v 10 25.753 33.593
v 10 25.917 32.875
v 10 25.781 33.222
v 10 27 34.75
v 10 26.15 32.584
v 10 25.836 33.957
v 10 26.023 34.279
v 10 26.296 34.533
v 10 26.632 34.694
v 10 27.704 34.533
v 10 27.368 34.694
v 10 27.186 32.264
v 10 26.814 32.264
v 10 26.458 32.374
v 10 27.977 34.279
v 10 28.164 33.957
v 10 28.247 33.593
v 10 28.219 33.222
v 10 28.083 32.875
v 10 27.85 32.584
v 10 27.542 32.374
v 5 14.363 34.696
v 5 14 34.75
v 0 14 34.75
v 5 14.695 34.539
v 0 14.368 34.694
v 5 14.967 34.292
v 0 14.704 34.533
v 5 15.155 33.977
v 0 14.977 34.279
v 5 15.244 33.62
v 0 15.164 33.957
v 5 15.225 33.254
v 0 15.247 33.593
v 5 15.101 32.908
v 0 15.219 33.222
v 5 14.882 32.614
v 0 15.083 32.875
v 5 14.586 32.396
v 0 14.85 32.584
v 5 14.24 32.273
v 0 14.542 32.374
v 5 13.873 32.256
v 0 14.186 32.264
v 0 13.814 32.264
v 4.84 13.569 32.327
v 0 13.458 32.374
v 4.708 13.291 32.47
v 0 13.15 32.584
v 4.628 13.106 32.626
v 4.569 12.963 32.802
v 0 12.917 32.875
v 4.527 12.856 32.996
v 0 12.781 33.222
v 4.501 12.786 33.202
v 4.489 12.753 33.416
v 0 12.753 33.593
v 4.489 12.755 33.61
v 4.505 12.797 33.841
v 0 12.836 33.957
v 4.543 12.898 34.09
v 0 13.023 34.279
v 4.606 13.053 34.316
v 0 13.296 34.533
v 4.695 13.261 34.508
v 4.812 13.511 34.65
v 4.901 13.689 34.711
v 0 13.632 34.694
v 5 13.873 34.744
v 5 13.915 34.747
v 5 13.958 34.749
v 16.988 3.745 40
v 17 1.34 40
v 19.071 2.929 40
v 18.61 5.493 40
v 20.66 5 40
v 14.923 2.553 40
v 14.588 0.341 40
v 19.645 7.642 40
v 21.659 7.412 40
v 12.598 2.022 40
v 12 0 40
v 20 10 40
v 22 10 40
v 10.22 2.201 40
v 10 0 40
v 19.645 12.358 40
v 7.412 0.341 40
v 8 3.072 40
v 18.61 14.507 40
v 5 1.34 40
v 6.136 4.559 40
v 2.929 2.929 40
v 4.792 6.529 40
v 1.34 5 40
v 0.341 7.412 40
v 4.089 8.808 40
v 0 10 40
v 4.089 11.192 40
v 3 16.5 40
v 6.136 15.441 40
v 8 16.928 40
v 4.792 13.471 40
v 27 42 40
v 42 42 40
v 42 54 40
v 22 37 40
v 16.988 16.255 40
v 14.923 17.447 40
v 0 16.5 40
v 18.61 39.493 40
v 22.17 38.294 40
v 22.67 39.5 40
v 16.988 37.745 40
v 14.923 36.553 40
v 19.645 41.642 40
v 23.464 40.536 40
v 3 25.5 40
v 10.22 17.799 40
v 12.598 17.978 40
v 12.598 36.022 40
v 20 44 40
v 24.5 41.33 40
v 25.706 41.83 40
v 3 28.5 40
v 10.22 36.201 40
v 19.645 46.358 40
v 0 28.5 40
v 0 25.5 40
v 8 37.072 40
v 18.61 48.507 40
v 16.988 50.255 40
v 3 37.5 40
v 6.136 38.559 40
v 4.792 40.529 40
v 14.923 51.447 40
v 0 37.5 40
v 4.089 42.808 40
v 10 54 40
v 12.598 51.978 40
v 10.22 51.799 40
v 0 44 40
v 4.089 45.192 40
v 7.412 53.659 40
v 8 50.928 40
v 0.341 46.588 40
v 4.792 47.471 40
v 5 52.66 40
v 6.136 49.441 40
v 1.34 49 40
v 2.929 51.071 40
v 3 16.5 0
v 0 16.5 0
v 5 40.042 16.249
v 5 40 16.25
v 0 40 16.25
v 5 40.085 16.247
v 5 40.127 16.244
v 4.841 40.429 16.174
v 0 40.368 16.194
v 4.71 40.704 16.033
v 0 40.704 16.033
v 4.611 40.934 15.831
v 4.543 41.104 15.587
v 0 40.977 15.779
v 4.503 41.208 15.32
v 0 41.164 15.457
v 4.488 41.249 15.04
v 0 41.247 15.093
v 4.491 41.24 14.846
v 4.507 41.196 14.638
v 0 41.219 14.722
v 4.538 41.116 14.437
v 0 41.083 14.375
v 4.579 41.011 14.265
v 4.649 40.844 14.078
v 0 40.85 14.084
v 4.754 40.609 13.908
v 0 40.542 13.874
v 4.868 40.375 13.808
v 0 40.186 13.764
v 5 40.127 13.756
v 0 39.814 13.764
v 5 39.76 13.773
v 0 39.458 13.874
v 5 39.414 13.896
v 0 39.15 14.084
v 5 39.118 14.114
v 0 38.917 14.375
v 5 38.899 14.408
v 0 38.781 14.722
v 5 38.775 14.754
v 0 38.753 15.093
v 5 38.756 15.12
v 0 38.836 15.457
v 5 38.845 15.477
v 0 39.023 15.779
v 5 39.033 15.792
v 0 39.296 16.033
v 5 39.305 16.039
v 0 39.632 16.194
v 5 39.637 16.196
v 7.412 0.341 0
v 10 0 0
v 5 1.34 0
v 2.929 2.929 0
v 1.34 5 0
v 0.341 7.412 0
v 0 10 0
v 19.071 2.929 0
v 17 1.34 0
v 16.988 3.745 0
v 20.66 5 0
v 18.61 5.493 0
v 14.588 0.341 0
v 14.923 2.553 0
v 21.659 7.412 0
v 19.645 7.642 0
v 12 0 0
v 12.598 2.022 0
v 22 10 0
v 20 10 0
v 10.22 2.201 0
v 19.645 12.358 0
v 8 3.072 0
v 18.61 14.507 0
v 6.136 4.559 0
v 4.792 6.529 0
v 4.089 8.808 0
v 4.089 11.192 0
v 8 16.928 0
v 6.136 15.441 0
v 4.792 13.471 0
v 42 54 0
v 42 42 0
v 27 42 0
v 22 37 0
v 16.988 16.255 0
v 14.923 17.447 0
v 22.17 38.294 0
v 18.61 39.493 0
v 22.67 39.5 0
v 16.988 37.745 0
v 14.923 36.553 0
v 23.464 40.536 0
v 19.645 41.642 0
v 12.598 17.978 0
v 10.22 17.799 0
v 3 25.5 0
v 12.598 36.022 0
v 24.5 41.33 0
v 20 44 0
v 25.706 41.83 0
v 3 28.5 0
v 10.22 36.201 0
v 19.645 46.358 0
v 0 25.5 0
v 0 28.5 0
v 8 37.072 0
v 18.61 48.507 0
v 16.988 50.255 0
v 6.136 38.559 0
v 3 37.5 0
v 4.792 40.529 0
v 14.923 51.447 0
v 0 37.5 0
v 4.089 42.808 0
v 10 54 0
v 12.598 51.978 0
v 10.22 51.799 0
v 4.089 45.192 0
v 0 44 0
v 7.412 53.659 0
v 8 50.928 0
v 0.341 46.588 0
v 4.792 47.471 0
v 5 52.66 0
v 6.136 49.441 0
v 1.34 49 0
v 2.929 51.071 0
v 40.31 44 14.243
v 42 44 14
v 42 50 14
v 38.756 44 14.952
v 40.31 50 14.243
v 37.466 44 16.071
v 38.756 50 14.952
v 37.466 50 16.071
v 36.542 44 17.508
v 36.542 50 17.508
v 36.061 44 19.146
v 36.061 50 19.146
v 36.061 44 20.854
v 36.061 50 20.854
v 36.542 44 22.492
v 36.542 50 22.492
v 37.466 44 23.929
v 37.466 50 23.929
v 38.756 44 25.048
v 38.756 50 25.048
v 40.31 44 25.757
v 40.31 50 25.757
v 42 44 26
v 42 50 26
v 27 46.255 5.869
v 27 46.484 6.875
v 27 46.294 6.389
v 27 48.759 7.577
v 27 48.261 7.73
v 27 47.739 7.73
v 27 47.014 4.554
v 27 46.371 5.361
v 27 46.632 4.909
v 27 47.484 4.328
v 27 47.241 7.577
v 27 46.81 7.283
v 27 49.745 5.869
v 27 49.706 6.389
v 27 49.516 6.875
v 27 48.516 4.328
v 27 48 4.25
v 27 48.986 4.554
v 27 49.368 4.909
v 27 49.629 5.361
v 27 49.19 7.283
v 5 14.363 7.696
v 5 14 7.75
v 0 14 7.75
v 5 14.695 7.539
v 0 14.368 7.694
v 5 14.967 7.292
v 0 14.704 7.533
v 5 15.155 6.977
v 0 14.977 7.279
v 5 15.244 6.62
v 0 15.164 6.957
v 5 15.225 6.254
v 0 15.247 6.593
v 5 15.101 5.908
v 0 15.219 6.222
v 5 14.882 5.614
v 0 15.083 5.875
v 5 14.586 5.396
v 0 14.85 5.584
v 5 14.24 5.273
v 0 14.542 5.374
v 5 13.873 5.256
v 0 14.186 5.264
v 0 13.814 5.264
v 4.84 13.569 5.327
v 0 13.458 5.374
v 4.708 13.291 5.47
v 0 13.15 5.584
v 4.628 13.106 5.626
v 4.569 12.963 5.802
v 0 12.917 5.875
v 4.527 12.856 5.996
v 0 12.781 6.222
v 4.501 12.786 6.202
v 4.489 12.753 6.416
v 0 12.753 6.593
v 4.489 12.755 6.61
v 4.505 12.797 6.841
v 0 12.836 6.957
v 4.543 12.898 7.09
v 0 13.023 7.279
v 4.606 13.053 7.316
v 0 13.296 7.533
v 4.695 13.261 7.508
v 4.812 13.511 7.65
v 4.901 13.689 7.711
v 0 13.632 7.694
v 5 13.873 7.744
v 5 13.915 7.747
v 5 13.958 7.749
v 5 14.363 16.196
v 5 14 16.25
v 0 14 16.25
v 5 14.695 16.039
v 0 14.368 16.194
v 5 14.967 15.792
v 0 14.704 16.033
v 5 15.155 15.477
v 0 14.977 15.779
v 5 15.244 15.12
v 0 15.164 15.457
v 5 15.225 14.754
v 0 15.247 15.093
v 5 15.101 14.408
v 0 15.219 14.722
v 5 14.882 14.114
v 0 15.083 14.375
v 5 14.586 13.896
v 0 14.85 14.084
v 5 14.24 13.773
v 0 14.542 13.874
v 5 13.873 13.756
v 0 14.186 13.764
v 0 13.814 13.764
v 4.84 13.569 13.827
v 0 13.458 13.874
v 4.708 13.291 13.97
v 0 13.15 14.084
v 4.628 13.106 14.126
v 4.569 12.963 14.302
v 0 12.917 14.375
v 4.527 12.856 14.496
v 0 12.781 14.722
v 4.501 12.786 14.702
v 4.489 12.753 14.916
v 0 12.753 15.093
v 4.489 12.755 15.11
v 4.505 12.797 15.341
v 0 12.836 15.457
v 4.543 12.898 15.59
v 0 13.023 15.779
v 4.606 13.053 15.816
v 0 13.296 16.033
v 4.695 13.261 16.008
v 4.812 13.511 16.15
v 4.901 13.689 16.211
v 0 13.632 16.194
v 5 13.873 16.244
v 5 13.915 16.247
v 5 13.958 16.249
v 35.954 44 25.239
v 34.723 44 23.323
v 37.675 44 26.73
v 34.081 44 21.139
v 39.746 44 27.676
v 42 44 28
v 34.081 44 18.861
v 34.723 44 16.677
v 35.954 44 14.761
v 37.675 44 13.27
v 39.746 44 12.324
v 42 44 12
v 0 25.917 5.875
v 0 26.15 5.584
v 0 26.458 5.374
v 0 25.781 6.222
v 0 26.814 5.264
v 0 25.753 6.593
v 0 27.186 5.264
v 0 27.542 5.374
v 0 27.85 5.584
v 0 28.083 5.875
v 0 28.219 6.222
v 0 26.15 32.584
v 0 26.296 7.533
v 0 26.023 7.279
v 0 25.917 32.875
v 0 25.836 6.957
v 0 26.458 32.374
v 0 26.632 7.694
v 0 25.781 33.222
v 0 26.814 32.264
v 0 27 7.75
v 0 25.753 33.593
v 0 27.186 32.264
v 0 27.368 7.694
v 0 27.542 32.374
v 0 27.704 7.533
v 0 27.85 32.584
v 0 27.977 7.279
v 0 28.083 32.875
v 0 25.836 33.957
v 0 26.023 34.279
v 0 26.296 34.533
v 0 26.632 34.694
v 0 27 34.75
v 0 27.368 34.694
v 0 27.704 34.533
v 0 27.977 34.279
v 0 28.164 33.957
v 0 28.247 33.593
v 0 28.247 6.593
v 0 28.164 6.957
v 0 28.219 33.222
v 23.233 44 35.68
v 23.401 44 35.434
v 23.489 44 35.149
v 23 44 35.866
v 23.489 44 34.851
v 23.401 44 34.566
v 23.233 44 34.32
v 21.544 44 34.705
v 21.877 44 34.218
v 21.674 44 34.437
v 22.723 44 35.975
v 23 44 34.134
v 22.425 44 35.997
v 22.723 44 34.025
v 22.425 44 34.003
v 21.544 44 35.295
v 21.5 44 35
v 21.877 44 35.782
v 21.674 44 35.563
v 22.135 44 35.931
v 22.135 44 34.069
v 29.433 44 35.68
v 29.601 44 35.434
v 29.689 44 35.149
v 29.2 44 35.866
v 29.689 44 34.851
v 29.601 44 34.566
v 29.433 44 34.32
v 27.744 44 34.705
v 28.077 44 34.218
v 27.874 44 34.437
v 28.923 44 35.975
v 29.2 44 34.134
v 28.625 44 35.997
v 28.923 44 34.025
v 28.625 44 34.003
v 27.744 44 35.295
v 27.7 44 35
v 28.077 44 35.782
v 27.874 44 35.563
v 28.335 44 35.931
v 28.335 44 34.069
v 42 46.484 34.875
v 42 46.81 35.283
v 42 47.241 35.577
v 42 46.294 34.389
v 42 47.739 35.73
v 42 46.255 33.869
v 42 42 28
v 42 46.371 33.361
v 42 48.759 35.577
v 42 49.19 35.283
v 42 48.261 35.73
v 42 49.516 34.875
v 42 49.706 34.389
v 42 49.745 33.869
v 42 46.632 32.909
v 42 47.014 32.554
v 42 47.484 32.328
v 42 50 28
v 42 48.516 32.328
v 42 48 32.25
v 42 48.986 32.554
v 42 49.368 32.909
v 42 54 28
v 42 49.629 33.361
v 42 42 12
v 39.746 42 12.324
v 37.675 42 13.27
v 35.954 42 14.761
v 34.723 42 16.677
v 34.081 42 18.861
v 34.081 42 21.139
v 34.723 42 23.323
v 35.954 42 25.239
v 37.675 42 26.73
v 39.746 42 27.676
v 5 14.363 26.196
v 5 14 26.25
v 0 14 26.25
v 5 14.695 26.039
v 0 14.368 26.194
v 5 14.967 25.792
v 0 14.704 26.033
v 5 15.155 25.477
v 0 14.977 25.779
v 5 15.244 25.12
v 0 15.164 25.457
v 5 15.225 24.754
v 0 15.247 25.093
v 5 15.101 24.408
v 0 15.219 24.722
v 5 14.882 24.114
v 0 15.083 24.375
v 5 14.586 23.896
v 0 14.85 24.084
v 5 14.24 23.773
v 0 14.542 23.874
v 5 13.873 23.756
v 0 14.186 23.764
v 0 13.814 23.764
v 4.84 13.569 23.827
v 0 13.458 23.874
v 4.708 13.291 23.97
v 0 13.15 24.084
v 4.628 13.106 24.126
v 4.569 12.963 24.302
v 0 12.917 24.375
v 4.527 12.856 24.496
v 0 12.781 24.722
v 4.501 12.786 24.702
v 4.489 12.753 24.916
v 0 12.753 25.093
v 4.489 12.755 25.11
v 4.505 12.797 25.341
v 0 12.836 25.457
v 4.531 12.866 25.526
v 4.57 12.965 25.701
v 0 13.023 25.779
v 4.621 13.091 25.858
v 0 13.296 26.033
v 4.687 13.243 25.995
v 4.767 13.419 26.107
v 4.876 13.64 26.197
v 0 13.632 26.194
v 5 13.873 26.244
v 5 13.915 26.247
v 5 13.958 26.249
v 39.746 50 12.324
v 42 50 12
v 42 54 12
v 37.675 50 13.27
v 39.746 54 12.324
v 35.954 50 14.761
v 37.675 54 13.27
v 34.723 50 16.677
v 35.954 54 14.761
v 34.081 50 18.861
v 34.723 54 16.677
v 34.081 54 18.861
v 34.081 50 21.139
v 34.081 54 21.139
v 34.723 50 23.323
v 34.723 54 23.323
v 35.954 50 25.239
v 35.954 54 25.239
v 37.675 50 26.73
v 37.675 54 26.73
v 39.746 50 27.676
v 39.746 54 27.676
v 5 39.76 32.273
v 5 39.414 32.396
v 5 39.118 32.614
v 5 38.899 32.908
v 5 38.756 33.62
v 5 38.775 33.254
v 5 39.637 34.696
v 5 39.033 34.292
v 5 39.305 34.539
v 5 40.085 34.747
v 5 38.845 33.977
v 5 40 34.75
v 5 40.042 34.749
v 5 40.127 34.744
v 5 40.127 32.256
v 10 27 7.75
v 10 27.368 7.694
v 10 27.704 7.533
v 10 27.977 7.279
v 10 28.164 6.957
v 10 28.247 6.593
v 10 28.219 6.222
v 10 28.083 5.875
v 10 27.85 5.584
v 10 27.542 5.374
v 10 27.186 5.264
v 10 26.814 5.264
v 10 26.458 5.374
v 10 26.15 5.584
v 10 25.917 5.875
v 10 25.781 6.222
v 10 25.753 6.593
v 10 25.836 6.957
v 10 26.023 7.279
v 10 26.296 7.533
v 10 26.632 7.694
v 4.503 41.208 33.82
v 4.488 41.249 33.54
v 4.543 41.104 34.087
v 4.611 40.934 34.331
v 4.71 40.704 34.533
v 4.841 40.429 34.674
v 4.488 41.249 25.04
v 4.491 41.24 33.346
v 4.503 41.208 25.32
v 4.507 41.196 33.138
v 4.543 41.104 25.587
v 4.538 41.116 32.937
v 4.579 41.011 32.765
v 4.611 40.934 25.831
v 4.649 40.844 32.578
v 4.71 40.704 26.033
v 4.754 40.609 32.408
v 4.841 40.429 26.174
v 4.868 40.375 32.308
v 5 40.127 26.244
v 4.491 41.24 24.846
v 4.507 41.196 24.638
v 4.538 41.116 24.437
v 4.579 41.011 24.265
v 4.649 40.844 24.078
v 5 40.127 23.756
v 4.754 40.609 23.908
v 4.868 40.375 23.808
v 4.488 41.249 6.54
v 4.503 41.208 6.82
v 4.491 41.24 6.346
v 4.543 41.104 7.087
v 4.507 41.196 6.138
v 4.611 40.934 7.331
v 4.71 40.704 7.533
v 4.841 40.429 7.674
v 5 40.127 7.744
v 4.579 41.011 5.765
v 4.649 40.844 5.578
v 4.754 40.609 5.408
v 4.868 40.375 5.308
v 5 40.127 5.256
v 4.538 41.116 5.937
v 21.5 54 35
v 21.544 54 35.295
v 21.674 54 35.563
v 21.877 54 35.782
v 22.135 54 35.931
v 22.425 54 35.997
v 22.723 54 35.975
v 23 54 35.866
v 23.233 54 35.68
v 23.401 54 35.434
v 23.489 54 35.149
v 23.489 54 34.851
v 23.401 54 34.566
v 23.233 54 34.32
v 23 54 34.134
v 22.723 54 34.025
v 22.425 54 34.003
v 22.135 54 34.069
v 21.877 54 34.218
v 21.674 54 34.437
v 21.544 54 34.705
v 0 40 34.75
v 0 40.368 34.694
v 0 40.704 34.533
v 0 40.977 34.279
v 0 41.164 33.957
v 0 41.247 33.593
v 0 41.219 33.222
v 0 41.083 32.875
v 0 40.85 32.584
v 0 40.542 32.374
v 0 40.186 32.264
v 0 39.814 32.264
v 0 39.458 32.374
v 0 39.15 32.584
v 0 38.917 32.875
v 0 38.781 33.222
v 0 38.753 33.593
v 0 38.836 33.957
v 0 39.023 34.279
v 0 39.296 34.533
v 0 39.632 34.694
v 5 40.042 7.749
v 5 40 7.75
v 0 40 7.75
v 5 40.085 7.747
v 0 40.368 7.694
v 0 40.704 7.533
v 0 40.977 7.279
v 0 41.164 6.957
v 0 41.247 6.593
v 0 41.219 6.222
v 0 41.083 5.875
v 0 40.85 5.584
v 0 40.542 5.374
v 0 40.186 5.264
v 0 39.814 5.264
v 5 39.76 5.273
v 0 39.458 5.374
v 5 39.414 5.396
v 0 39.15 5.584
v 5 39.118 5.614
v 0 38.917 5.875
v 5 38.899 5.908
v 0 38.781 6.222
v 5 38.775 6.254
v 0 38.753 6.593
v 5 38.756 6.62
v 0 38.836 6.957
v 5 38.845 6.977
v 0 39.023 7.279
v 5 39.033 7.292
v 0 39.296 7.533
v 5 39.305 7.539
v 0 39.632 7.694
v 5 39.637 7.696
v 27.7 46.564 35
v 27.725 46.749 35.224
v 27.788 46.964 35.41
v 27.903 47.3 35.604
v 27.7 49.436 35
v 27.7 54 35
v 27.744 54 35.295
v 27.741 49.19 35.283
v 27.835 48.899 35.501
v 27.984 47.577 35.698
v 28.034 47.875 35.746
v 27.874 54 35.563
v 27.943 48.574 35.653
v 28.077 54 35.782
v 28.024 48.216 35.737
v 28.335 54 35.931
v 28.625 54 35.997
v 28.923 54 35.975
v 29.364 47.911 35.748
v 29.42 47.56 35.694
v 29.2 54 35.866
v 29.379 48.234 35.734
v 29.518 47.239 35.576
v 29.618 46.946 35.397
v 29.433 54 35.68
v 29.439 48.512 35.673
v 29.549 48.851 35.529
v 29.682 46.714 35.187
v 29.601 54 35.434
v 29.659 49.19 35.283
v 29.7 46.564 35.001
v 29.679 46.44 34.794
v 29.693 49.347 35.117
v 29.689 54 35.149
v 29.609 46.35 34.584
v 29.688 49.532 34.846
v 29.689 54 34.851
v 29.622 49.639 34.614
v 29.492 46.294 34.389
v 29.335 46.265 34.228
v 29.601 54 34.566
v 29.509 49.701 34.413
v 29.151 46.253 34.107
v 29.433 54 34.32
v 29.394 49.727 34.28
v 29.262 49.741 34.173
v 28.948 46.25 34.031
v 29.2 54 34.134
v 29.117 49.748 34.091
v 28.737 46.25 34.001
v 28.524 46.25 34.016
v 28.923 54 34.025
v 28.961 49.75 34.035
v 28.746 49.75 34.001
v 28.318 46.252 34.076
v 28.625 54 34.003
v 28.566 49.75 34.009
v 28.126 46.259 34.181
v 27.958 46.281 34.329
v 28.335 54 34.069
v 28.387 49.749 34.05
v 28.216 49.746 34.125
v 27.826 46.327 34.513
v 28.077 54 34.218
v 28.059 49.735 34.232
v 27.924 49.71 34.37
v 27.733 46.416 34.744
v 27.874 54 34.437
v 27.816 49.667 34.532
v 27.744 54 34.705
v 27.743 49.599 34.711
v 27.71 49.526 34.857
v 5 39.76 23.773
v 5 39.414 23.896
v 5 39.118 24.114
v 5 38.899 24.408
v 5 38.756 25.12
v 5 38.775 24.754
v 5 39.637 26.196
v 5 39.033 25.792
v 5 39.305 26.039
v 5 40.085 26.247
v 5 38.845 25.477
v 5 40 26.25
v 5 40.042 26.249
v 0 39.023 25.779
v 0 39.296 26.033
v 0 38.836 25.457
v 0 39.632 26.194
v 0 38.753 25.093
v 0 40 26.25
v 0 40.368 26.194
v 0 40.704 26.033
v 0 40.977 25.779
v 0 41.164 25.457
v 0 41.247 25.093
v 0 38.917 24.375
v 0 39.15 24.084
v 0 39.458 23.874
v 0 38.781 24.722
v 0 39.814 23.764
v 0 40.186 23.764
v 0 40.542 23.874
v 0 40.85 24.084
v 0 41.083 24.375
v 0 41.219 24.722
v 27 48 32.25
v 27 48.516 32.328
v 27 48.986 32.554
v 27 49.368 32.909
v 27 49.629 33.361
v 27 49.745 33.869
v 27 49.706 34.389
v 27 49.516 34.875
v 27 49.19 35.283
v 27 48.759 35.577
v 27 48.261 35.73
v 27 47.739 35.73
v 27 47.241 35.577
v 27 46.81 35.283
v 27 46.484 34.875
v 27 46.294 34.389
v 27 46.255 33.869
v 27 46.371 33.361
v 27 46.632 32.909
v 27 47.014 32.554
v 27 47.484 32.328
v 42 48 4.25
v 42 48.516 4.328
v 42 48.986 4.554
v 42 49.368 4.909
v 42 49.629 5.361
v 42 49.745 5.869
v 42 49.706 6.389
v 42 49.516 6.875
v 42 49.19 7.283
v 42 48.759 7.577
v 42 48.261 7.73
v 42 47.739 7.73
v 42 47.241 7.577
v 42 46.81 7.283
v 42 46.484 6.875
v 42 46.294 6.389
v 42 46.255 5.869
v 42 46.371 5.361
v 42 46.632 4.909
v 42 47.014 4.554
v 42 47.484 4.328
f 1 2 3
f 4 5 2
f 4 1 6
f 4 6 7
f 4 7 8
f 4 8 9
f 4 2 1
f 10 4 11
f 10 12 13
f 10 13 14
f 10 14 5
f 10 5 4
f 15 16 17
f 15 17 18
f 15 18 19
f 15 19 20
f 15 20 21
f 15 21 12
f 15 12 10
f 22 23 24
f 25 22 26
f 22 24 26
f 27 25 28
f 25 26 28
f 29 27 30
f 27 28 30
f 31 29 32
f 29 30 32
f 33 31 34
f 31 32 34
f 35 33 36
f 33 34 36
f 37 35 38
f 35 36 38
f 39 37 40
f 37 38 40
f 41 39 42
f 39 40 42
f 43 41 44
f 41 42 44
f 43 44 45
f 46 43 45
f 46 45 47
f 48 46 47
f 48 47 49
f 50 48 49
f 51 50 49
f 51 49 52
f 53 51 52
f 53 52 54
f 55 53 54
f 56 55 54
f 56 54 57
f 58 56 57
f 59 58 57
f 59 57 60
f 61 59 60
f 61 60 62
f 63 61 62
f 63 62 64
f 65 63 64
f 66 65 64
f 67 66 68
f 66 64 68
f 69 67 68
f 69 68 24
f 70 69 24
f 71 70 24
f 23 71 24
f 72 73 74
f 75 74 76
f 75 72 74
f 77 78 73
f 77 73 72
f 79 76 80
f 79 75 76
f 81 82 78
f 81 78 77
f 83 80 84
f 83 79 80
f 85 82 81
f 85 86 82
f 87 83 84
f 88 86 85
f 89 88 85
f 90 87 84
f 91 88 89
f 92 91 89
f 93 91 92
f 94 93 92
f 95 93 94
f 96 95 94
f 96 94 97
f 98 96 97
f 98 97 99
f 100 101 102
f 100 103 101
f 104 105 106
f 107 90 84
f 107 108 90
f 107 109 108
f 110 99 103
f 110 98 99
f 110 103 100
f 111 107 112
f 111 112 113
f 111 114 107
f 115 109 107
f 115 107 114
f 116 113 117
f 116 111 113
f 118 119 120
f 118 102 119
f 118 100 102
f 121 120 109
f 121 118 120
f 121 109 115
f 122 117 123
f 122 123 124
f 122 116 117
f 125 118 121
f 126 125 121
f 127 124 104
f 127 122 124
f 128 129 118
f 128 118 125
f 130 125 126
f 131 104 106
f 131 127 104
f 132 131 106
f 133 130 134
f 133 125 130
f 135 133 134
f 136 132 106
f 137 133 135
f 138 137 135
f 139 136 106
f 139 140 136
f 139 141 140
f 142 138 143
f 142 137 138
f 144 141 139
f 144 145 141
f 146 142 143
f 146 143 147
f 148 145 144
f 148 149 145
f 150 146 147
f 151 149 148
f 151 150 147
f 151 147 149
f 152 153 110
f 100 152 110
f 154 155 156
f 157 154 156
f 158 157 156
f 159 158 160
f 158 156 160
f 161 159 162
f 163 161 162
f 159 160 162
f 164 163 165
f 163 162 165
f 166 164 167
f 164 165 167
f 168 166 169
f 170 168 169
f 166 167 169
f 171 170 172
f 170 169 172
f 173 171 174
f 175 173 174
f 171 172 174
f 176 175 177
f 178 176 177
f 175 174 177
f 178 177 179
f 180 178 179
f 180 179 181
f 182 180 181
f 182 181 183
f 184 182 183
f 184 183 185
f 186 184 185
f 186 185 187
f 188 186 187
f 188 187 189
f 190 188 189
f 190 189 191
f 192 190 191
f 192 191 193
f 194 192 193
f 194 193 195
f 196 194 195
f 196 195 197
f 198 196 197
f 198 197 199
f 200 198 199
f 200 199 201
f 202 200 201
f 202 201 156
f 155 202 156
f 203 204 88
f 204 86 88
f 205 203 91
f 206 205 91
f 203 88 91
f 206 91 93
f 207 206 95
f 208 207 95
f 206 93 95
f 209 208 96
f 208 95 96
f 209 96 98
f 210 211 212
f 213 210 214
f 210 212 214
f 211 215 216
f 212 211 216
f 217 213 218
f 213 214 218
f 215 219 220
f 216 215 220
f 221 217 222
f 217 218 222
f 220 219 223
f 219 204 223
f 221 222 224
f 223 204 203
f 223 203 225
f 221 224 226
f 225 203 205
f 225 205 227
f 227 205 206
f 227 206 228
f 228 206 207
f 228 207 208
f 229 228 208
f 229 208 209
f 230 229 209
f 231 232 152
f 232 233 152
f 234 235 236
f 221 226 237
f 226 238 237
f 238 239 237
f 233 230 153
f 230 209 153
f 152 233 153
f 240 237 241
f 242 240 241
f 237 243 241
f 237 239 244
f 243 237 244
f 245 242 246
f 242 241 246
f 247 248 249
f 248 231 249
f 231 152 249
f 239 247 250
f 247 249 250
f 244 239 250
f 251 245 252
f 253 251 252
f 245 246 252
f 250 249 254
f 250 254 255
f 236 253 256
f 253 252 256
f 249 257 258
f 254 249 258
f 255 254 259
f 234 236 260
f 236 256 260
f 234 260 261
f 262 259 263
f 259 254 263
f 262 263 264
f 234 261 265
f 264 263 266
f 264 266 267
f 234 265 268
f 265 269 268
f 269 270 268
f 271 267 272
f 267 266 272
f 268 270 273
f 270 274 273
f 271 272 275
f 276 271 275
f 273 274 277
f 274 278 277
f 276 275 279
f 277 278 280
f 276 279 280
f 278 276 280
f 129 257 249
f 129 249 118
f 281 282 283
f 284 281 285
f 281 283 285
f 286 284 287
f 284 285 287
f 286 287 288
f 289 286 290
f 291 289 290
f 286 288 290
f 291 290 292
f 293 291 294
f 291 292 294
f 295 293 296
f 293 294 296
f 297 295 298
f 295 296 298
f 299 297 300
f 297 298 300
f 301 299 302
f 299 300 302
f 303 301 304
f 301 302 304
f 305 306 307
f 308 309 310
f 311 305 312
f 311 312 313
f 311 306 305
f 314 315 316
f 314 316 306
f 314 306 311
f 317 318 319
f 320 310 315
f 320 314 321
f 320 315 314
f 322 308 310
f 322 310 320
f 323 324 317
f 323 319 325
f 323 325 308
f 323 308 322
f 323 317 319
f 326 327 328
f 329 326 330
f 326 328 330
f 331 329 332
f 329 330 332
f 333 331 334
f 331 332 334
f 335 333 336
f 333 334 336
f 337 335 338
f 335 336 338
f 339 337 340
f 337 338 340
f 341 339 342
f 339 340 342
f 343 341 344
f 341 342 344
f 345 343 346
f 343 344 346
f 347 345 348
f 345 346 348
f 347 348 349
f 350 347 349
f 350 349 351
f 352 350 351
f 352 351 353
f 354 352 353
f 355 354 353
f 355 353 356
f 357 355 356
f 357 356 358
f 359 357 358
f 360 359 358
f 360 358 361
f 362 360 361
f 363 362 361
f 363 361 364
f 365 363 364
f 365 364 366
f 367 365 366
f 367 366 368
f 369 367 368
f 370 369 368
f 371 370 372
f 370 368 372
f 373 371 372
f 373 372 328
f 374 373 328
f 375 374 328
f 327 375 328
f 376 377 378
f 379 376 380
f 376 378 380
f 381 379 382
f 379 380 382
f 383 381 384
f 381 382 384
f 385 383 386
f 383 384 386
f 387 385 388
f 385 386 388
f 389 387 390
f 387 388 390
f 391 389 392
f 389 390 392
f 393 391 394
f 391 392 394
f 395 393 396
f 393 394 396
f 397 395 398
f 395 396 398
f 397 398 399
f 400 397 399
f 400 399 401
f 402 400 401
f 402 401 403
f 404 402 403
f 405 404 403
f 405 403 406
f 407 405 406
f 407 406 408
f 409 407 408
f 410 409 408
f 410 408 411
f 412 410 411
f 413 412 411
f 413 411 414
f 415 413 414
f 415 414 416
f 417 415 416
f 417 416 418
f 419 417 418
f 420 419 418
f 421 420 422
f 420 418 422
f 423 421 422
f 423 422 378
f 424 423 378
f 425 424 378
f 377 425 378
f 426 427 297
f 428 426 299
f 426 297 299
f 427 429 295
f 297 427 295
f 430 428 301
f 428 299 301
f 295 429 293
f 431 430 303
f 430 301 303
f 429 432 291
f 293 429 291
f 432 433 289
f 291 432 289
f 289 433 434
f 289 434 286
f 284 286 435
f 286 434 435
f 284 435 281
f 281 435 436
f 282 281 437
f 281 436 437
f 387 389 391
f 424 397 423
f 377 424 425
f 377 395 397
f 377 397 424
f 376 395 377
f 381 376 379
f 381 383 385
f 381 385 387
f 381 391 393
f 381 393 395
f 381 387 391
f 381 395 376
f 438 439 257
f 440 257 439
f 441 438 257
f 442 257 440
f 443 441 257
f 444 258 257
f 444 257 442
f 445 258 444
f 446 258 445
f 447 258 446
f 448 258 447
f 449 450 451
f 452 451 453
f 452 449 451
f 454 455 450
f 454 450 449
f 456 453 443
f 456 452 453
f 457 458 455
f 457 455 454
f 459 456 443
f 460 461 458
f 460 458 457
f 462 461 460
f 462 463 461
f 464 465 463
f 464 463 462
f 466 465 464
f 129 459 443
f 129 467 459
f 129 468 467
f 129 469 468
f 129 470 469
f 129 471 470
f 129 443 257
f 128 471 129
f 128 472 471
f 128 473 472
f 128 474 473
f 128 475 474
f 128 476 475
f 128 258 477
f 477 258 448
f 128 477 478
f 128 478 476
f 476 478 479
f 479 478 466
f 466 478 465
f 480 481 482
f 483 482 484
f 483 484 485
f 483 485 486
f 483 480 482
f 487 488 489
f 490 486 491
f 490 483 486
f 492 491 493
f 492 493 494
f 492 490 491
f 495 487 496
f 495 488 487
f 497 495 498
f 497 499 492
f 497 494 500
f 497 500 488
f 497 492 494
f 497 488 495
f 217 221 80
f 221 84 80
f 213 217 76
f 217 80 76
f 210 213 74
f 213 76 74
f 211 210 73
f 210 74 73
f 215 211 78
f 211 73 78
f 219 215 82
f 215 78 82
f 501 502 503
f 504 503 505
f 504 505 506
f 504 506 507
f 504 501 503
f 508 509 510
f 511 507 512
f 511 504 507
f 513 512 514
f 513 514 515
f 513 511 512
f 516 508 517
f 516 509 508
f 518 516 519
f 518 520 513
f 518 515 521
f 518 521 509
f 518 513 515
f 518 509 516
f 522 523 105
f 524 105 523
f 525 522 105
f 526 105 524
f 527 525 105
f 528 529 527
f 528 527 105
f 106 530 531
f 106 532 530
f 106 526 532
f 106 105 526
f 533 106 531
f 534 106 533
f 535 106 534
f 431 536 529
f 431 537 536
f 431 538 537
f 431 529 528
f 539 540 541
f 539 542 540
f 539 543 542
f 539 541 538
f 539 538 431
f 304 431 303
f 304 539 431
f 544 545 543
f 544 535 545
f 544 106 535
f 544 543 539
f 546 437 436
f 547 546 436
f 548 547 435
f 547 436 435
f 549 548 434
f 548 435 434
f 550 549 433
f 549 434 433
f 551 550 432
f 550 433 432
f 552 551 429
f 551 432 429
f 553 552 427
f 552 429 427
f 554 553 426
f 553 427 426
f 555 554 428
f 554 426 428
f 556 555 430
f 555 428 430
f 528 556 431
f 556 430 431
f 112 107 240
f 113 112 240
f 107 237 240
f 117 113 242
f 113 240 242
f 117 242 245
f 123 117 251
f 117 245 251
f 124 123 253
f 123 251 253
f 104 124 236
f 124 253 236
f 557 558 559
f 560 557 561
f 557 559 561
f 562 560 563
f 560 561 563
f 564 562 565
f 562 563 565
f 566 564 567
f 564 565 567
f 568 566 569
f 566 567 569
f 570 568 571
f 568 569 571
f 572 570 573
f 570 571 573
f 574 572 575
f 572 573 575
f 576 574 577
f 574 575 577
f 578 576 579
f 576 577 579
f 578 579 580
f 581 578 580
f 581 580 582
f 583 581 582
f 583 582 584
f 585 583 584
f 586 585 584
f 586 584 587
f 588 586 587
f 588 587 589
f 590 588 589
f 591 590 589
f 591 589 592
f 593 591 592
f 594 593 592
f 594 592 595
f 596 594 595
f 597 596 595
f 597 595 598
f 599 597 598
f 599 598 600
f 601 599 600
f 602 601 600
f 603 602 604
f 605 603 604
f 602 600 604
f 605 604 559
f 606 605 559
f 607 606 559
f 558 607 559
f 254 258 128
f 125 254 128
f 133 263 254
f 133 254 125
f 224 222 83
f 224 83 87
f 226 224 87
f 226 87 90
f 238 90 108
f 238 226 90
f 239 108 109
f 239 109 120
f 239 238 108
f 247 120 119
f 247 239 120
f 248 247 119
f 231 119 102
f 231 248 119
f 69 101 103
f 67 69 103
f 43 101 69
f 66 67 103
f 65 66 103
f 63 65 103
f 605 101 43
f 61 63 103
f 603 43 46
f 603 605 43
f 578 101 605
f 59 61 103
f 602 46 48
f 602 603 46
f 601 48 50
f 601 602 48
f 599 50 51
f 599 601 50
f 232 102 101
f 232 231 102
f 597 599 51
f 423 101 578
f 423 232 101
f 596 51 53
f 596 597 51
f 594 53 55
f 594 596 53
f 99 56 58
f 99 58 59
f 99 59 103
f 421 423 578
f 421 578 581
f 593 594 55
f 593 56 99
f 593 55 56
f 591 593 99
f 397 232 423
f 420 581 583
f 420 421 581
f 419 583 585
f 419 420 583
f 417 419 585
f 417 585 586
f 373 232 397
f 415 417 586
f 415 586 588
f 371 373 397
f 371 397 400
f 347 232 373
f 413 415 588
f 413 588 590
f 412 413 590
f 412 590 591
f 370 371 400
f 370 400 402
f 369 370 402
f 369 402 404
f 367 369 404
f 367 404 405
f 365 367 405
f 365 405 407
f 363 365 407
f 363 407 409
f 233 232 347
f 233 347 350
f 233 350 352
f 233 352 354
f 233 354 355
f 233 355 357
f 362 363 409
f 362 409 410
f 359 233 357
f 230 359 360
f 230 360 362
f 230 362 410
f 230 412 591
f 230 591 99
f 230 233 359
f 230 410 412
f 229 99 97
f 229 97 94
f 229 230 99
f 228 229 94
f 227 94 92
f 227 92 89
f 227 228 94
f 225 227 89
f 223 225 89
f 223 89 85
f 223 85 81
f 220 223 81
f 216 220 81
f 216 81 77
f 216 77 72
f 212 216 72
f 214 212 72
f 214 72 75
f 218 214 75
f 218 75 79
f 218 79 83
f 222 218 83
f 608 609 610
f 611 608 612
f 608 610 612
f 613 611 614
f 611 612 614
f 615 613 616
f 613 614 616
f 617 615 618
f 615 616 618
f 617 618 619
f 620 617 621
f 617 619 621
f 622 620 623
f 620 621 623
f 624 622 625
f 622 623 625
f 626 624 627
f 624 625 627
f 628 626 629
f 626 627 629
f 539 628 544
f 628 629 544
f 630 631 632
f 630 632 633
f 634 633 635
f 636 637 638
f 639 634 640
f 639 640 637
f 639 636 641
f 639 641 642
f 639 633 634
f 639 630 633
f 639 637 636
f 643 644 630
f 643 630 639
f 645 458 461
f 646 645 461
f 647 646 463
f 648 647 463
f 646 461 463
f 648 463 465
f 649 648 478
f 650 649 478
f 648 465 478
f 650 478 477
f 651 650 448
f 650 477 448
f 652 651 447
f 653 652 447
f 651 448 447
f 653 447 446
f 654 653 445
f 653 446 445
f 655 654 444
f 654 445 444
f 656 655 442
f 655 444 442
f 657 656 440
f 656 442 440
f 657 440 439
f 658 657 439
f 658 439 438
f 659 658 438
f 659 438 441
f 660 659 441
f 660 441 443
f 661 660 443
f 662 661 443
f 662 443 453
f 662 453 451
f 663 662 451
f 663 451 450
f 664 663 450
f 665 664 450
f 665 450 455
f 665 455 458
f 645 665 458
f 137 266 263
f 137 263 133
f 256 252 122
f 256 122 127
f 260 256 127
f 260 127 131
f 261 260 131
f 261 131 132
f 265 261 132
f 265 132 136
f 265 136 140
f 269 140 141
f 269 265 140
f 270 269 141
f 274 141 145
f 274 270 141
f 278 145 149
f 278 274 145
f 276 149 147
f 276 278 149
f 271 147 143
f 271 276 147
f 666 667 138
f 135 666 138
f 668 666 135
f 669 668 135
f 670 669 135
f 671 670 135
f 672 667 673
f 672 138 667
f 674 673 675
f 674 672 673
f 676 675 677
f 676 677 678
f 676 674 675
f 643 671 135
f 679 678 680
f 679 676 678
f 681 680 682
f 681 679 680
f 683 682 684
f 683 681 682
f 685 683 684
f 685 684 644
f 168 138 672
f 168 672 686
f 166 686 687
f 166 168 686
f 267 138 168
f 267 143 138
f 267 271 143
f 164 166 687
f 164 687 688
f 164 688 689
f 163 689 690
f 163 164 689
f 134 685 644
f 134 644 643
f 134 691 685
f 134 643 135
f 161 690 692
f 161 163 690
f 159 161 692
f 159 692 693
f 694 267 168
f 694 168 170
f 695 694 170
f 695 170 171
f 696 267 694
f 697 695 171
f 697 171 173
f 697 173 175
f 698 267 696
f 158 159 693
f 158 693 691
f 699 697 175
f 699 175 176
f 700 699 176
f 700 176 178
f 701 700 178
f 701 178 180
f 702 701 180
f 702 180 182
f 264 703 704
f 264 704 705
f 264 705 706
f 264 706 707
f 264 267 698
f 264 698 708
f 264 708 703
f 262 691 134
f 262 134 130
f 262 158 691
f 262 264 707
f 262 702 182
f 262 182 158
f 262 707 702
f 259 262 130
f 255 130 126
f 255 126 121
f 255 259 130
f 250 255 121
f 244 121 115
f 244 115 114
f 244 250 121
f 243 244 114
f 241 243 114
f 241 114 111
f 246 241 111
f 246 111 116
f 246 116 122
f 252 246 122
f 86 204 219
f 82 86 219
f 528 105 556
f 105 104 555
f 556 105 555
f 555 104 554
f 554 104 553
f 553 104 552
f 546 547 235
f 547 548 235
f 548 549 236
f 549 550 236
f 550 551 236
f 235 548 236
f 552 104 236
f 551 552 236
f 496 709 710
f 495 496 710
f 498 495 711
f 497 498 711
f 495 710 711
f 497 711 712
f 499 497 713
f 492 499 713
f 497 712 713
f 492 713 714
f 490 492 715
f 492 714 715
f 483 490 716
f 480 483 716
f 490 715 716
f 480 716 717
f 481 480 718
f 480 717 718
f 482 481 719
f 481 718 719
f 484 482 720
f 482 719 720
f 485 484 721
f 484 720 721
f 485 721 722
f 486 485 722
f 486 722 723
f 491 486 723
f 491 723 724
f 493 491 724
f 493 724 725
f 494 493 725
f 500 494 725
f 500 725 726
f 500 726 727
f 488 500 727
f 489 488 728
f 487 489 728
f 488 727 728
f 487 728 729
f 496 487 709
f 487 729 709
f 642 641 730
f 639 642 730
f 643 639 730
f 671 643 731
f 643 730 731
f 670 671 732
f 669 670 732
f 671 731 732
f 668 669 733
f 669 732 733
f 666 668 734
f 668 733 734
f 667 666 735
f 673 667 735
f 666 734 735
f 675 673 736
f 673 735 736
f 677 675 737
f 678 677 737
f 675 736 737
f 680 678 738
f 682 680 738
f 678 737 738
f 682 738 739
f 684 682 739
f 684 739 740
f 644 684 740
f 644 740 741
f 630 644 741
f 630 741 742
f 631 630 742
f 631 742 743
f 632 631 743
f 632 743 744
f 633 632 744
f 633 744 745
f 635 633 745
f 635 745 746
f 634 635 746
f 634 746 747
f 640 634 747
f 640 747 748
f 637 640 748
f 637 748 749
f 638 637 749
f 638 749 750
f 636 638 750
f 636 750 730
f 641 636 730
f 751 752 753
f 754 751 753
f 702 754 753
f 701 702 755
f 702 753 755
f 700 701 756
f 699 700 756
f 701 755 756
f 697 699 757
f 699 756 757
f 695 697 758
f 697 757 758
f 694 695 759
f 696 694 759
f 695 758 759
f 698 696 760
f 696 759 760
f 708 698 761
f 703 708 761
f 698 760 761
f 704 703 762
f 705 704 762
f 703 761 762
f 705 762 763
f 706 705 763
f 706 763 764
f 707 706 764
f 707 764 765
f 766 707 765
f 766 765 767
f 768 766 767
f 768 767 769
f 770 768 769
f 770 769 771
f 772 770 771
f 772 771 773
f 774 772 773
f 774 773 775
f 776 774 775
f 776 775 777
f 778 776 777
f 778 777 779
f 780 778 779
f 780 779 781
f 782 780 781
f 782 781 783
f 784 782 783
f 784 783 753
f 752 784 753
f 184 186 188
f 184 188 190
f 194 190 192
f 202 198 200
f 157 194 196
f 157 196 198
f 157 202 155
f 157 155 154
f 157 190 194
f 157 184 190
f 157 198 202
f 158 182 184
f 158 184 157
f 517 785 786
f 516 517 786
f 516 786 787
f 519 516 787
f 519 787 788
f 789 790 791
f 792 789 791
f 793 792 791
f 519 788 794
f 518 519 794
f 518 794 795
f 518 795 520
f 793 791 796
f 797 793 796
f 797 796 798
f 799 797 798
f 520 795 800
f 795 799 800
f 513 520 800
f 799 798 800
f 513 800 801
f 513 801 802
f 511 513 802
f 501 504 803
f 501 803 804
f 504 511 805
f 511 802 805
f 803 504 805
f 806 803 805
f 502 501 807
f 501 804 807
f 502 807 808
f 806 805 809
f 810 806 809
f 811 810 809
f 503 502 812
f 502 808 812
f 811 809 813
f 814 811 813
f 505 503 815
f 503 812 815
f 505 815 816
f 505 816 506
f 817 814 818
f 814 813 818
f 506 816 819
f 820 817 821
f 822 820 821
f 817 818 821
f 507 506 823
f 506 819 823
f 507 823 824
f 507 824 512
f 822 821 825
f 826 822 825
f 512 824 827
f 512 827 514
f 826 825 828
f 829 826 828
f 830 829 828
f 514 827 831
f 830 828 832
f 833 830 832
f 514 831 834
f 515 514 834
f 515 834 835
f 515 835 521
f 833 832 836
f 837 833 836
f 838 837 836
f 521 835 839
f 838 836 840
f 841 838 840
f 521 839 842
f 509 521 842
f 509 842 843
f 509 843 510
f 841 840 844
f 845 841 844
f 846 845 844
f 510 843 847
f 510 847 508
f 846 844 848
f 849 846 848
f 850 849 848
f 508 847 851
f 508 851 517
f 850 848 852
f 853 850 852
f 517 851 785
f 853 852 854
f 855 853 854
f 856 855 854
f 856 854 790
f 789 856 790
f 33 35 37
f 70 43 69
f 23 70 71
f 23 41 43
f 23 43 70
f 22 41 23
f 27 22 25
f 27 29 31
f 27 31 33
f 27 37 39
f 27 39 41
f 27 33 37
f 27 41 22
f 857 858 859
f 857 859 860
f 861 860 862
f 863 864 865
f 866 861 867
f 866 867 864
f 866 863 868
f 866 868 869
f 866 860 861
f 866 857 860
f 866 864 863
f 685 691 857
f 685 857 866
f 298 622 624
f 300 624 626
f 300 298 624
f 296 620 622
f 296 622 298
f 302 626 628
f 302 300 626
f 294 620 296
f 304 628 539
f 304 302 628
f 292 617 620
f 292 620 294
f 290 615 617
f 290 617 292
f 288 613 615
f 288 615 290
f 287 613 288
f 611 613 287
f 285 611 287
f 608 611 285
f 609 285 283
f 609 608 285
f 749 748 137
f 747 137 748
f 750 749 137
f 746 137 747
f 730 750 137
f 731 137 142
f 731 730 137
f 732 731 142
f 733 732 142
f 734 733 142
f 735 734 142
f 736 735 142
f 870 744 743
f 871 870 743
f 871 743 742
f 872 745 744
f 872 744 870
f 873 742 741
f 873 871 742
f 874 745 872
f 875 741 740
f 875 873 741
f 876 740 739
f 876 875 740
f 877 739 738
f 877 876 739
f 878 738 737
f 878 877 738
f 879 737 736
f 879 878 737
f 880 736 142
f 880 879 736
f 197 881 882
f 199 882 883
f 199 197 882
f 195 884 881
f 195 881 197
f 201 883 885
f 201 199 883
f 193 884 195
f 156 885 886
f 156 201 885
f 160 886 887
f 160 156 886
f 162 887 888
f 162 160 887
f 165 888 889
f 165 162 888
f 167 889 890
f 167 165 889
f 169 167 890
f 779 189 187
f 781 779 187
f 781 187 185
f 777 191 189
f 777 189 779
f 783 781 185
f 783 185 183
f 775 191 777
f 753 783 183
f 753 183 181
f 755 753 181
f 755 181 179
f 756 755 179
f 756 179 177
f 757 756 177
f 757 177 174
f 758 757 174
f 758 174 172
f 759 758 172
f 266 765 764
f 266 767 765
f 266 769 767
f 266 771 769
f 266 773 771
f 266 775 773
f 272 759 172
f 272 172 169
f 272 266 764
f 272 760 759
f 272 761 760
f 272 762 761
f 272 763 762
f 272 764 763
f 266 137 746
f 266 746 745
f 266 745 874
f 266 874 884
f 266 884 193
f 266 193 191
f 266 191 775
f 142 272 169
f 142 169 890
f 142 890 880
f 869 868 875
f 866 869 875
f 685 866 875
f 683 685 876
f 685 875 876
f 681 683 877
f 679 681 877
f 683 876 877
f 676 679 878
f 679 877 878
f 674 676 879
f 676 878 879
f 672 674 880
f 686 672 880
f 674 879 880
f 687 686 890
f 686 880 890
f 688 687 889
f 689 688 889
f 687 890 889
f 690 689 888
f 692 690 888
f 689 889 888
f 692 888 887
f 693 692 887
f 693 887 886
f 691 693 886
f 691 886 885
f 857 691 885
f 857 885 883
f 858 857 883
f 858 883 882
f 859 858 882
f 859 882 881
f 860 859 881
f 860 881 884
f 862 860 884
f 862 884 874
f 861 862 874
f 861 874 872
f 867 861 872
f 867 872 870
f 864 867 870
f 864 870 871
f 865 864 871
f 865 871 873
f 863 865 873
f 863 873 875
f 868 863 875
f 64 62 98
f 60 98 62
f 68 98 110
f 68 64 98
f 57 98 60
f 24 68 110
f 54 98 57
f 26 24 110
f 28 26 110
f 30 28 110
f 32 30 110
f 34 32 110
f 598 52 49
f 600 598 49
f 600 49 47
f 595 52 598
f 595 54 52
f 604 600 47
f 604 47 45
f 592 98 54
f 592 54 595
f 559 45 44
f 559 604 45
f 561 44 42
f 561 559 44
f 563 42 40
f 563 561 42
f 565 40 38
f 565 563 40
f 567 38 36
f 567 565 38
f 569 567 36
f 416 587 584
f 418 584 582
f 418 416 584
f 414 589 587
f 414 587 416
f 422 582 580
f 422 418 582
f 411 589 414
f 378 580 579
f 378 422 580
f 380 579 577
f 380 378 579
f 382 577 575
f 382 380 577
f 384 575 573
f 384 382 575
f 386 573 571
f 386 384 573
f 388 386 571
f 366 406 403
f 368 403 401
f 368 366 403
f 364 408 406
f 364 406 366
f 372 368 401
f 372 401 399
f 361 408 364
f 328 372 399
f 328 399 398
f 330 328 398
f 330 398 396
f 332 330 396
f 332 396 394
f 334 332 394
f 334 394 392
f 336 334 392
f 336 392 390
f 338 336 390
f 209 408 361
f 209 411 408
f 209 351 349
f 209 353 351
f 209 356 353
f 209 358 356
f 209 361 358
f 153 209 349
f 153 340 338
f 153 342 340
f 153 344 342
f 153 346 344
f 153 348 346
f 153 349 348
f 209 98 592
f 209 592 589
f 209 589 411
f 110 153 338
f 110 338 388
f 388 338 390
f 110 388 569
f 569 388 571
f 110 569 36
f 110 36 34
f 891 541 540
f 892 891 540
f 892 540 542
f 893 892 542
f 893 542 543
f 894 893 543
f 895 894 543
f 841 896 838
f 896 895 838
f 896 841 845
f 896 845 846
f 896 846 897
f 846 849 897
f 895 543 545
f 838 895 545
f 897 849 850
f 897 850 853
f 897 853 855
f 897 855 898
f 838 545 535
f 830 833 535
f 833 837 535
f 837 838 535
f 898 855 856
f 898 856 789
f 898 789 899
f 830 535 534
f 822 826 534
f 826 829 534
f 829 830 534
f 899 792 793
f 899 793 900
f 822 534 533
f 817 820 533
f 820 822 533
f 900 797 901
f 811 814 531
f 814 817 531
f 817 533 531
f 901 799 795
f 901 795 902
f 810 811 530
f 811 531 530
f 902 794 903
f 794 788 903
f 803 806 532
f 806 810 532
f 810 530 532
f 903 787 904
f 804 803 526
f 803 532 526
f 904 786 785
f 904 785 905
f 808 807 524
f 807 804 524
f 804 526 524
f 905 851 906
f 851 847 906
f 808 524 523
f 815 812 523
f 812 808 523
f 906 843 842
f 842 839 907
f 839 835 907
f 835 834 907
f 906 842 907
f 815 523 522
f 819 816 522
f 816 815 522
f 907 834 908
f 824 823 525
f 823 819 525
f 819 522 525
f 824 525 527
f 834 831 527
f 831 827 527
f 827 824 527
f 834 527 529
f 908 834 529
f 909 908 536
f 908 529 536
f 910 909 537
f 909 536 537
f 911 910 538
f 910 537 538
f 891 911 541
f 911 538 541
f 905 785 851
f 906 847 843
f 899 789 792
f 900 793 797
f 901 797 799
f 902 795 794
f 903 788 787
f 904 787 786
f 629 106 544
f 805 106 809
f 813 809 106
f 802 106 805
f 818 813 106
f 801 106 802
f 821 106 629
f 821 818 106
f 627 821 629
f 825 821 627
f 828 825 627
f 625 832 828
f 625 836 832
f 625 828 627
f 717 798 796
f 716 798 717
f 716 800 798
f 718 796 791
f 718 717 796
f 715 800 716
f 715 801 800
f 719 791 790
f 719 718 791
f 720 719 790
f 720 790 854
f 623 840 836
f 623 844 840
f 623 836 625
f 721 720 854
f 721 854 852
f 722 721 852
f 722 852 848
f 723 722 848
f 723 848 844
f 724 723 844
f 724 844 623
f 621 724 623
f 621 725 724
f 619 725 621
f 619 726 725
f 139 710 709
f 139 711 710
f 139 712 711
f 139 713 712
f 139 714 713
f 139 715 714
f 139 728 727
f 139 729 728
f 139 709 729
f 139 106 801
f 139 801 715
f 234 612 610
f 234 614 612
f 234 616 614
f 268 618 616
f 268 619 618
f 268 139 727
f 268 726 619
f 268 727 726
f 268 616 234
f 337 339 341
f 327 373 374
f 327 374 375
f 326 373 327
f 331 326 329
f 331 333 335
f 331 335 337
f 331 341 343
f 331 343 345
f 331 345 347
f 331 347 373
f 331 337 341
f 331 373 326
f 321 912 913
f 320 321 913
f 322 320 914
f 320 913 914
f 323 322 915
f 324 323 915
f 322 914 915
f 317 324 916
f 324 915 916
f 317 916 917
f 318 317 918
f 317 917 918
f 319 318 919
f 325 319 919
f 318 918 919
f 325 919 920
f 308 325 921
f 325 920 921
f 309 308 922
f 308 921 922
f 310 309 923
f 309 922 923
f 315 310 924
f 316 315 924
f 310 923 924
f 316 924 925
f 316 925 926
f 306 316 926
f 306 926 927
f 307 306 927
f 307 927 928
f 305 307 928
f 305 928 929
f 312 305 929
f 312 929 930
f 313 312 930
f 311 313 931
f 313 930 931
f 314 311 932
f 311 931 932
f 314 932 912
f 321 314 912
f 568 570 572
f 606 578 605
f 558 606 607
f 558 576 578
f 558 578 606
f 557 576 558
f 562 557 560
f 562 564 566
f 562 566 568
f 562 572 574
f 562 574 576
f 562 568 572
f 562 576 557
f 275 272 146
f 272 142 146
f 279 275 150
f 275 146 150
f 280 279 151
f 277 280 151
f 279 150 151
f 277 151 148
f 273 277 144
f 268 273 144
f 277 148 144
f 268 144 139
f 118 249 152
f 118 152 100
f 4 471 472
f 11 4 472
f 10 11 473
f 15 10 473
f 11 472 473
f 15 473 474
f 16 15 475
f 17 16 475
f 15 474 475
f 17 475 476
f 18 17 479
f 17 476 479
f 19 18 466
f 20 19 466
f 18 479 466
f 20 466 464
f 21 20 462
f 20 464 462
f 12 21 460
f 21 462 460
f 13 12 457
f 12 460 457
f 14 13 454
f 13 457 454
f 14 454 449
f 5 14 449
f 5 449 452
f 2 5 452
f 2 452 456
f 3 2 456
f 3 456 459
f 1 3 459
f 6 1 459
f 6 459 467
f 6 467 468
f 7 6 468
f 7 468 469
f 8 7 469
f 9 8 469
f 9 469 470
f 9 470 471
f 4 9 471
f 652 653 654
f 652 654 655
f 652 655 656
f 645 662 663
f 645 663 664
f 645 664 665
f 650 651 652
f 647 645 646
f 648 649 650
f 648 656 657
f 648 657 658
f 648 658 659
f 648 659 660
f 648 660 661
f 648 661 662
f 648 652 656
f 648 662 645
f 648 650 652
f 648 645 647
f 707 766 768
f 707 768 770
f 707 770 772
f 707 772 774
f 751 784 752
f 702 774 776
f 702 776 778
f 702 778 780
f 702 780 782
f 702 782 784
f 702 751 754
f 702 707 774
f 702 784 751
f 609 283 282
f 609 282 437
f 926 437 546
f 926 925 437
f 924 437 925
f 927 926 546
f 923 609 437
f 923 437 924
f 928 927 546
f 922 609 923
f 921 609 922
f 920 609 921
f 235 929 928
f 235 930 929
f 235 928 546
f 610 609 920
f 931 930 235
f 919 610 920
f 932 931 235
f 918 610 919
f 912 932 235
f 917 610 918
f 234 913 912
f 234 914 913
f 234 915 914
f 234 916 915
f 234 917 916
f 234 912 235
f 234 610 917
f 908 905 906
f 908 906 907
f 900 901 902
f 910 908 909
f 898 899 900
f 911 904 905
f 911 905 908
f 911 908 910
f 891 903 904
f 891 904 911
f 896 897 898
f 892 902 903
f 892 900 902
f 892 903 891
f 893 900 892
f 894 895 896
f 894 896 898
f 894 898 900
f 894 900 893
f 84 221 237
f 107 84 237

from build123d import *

# Parameters (mm, degrees)
SKETCH1_W           = 22
SKETCH1_H           = 54
SKETCH1_R           = 8
BOSS_EXTRUDE1_DEPTH = 40
SKETCH2_W           = 48
SKETCH2_H           = 21
CUT_EXTRUDE1_DEPTH  = 3
SKETCH6_W           = 40
SKETCH6_H           = 12
BOSS_EXTRUDE2_DEPTH = 20
SKETCH7_R           = 8
CUT_EXTRUDE5_DEPTH  = 4
CUT_EXTRUDE6_START  = -10
SKETCH7_2_R         = 8
CUT_EXTRUDE6_DEPTH  = 3
SKETCH8_R           = 6
CUT_EXTRUDE7_DEPTH  = 7
SKETCH9_R           = 1.75
CUT_EXTRUDE8_DEPTH  = 15
SKETCH10_R          = 1.25
CUT_EXTRUDE9_DEPTH  = 5
SKETCH13_R          = 1.25
CUT_EXTRUDE10_DEPTH = 10
BOSS_EXTRUDE3_START = 3
SKETCH14_W          = 40
SKETCH14_H          = 3
SKETCH14_R          = 1.25
BOSS_EXTRUDE3_DEPTH = 3
FILLET1_R           = 10
FILLET2_R           = 5
SKETCH15_R          = 1
CUT_EXTRUDE11_DEPTH = 10


with BuildPart() as part:
    # Sketch1 → Boss-Extrude1 (new body)
    with BuildSketch(Plane.XY):
        with Locations((11, 27)):
            Rectangle(SKETCH1_W, SKETCH1_H)
        with Locations((12, 10)):
            Circle(SKETCH1_R, mode=Mode.SUBTRACT)
        with Locations((12, 44)):
            Circle(SKETCH1_R, mode=Mode.SUBTRACT)
    extrude(amount=BOSS_EXTRUDE1_DEPTH)

    # Sketch2 → Cut-Extrude1 (cut)
    with BuildSketch(Plane.ZY):
        with Locations((24, 27)):
            Rectangle(SKETCH2_W, SKETCH2_H)
    extrude(amount=-CUT_EXTRUDE1_DEPTH, mode=Mode.SUBTRACT)

    # Sketch6 → Boss-Extrude2 (add)
    with BuildSketch(Plane(origin=(22, 0, 0), x_dir=(0, 0, -1), z_dir=(1, 0, 0))):
        with Locations((-20, 48)):
            Rectangle(SKETCH6_W, SKETCH6_H)
    extrude(amount=BOSS_EXTRUDE2_DEPTH)

    # Sketch7 → Cut-Extrude5 (cut)
    with BuildSketch(Plane(origin=(0, 54, 0), x_dir=(1, 0, 0), z_dir=(0, 1, 0))):
        with Locations((42, -20)):
            Circle(SKETCH7_R)
    extrude(amount=-CUT_EXTRUDE5_DEPTH, mode=Mode.SUBTRACT)

    # Sketch7<2> → Cut-Extrude6 (cut)
    with BuildSketch(Plane(origin=(0, 54, 0), x_dir=(1, 0, 0), z_dir=(0, 1, 0)).offset(CUT_EXTRUDE6_START)):
        with Locations((42, -20)):
            Circle(SKETCH7_2_R)
    extrude(amount=-CUT_EXTRUDE6_DEPTH, mode=Mode.SUBTRACT)

    # Sketch8 → Cut-Extrude7 (cut)
    with BuildSketch(Plane(origin=(0, 50, 0), x_dir=(1, 0, 0), z_dir=(0, 1, 0))):
        with Locations((42, -20)):
            Circle(SKETCH8_R)
    extrude(amount=-CUT_EXTRUDE7_DEPTH, mode=Mode.SUBTRACT)

    # Sketch9 → Cut-Extrude8 (cut)
    with BuildSketch(Plane(origin=(42, 0, 0), x_dir=(0, 0, -1), z_dir=(1, 0, 0))):
        with Locations((-34, 48)):
            Circle(SKETCH9_R)
        with Locations((-6, 48)):
            Circle(SKETCH9_R)
    extrude(amount=-CUT_EXTRUDE8_DEPTH, mode=Mode.SUBTRACT)

    # Sketch10 → Cut-Extrude9 (cut)
    with BuildSketch(Plane.ZY):
        with Locations((33.5, 40)):
            Circle(SKETCH10_R)
        with Locations((33.5, 14)):
            Circle(SKETCH10_R)
        with Locations((6.5, 14)):
            Circle(SKETCH10_R)
        with Locations((6.5, 40)):
            Circle(SKETCH10_R)
        with Locations((15, 40)):
            Circle(SKETCH10_R)
        with Locations((25, 40)):
            Circle(SKETCH10_R)
        with Locations((15, 14)):
            Circle(SKETCH10_R)
        with Locations((25, 14)):
            Circle(SKETCH10_R)
    extrude(amount=-CUT_EXTRUDE9_DEPTH, mode=Mode.SUBTRACT)

    # Sketch13 → Cut-Extrude10 (cut)
    with BuildSketch(Plane.ZY):
        with Locations((6.5, 27)):
            Circle(SKETCH13_R)
        with Locations((33.5, 27)):
            Circle(SKETCH13_R)
    extrude(amount=-CUT_EXTRUDE10_DEPTH, mode=Mode.SUBTRACT)

    # Sketch14 → Boss-Extrude3 (add)
    with BuildSketch(Plane.ZY.offset(-3).offset(BOSS_EXTRUDE3_START)):
        with Locations((20, 27)):
            Rectangle(SKETCH14_W, SKETCH14_H)
        with Locations((6.5, 27)):
            Circle(SKETCH14_R, mode=Mode.SUBTRACT)
        with Locations((33.5, 27)):
            Circle(SKETCH14_R, mode=Mode.SUBTRACT)
    extrude(amount=-BOSS_EXTRUDE3_DEPTH)

    # Fillet1
    fillet1_edges = [part.edges().sort_by_distance(p)[0] for p in [
        (0, 54, 20),
        (22, 0, 20),
        (0, 0, 20),
    ]]
    fillet(fillet1_edges, radius=FILLET1_R)

    # Fillet2
    fillet2_edges = [part.edges().sort_by_distance(p)[0] for p in [
        (22, 42, 20),
    ]]
    fillet(fillet2_edges, radius=FILLET2_R)

    # Sketch15 → Cut-Extrude11 (cut)
    with BuildSketch(Plane(origin=(0, 54, 0), x_dir=(1, 0, 0), z_dir=(0, 1, 0))):
        with Locations(Location((22.5, -35, 0), (0, 0, 180))):
            Circle(SKETCH15_R)
        with Locations(Location((28.7, -35, 0), (0, 0, 180))):
            Circle(SKETCH15_R)
    extrude(amount=-CUT_EXTRUDE11_DEPTH, mode=Mode.SUBTRACT)


solid = part.part
